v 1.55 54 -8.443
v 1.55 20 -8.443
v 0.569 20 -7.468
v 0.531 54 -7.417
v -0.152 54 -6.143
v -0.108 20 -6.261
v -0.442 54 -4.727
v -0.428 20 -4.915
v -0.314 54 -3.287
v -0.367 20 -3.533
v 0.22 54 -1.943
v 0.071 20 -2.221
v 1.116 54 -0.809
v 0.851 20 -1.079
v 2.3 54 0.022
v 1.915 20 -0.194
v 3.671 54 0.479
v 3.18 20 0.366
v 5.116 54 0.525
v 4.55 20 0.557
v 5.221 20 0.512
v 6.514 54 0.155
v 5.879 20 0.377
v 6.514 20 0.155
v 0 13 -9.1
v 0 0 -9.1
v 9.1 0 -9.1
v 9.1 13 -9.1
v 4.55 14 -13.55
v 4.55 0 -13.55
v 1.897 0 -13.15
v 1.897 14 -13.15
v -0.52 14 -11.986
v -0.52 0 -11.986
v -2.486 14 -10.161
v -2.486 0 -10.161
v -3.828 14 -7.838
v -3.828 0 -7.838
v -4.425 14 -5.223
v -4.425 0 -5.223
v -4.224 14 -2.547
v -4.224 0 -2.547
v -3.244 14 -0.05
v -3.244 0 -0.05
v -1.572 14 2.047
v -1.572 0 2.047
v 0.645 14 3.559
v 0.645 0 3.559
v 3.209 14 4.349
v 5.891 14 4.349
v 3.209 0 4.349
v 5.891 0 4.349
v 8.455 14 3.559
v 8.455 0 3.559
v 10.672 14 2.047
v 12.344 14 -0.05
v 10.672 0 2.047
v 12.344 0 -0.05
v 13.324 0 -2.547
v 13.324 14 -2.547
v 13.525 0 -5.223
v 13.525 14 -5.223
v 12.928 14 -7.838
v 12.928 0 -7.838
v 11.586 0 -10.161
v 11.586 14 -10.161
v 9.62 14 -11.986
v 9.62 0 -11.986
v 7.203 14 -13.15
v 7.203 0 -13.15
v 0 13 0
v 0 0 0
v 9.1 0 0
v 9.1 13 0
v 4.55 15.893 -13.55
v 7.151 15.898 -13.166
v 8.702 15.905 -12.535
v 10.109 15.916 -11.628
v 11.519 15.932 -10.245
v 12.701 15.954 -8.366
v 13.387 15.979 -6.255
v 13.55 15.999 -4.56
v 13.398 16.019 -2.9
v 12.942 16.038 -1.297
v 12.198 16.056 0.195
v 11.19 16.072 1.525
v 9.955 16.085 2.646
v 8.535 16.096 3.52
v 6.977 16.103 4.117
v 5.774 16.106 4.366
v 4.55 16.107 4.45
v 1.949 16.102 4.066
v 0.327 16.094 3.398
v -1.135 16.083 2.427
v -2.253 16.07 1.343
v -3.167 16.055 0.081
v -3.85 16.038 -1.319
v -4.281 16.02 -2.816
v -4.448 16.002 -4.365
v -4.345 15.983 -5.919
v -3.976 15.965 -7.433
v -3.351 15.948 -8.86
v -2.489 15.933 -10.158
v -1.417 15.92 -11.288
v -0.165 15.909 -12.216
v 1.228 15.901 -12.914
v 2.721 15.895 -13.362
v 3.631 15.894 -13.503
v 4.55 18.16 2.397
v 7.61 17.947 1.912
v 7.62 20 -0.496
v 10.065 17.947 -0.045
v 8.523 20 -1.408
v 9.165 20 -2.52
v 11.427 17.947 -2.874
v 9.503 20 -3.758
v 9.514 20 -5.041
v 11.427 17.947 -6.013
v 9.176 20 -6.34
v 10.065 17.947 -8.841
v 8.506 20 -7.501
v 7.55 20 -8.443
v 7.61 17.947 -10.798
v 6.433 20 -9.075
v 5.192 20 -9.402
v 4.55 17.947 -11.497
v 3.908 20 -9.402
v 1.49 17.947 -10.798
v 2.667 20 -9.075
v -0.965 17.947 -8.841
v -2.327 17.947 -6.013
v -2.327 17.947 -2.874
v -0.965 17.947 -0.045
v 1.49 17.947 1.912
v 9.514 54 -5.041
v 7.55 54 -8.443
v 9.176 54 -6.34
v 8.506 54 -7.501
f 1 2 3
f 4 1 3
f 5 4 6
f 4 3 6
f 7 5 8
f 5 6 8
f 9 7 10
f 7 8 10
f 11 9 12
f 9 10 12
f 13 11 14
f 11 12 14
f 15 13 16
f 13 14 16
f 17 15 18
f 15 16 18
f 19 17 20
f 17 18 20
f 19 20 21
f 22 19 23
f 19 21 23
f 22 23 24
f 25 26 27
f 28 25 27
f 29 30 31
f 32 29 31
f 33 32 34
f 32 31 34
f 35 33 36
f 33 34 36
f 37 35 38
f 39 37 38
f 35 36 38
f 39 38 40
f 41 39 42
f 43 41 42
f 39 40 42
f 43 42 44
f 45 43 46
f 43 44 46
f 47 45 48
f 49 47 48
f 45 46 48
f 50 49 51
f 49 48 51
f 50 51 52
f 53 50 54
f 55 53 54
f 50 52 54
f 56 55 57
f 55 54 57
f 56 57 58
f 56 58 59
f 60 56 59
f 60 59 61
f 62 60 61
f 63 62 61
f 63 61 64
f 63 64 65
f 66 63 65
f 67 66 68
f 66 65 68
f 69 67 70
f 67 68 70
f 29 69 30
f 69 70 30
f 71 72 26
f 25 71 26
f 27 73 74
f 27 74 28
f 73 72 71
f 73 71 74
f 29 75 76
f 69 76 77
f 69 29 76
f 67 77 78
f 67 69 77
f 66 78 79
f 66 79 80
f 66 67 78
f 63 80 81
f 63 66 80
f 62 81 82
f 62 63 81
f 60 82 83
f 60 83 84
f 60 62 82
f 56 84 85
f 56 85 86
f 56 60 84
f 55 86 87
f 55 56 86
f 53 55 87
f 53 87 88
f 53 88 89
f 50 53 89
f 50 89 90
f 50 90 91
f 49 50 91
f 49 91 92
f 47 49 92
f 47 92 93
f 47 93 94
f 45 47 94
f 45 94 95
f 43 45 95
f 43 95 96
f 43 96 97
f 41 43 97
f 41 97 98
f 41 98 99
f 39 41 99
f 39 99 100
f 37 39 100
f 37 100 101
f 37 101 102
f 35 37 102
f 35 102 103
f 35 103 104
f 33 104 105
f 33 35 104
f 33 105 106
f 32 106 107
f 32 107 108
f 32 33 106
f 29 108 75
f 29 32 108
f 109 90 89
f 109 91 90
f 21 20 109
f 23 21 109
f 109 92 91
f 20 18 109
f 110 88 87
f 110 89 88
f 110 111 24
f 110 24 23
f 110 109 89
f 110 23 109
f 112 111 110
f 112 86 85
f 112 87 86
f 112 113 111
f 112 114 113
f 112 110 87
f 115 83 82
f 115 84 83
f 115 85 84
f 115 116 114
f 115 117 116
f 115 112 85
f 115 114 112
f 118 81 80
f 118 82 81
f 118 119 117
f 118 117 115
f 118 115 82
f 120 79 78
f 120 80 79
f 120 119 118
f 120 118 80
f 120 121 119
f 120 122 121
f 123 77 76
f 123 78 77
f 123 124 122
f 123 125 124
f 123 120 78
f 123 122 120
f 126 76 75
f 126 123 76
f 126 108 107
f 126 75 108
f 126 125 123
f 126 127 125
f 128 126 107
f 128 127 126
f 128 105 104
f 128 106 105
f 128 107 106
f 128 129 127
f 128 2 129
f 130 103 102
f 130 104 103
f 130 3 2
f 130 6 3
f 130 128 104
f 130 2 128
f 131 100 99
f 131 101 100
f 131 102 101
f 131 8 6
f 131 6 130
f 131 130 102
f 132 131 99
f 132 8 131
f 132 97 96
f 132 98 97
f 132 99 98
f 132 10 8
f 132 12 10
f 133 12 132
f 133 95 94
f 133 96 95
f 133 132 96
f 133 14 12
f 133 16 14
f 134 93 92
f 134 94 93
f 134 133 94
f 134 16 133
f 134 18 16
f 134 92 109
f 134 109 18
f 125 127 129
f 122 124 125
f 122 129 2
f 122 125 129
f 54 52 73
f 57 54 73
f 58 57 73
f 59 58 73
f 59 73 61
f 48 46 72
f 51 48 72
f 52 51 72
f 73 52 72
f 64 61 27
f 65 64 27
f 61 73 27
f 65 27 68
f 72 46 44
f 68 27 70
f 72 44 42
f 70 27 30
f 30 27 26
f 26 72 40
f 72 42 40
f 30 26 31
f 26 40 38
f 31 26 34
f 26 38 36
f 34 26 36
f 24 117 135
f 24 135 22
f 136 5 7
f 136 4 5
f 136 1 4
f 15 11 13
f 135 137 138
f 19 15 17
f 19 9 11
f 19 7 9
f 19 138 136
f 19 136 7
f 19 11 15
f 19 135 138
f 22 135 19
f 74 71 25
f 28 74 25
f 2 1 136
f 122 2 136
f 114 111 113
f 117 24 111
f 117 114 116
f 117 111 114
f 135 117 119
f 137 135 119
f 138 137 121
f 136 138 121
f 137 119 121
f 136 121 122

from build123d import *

# Parameters (mm, degrees)
SKETCH1_R           = 9
SKETCH1_W           = 9.1
SKETCH1_H           = 9.1
BOSS_EXTRUDE1_DEPTH = 13
SKETCH2_R           = 9
BOSS_EXTRUDE2_DEPTH = 1
SKETCH3_R           = 5
BOSS_EXTRUDE3_DEPTH = 40
CHAMFER1_SIZE       = 6
SKETCH4_W           = 6
SKETCH4_H           = 4.360376731
CUT_EXTRUDE1_DEPTH  = 34


with BuildPart() as part:
    # Sketch1 → Boss-Extrude1 (new body)
    with BuildSketch(Plane(origin=(0, 0, 0), x_dir=(1, 0, 0), z_dir=(0, 1, 0))):
        with Locations(Location((4.55, 4.55, 0), (0, 0, 90))):
            Circle(SKETCH1_R)
        with Locations((4.55, 4.55)):
            Rectangle(SKETCH1_W, SKETCH1_H, mode=Mode.SUBTRACT)
    extrude(amount=BOSS_EXTRUDE1_DEPTH)

    # Sketch2 → Boss-Extrude2 (add)
    with BuildSketch(Plane(origin=(0, 13, 0), x_dir=(1, 0, 0), z_dir=(0, 1, 0))):
        with Locations(Location((4.55, 4.55, 0), (0, 0, 90))):
            Circle(SKETCH2_R)
    extrude(amount=BOSS_EXTRUDE2_DEPTH)

    # Sketch3 → Boss-Extrude3 (add)
    with BuildSketch(Plane(origin=(0, 14, 0), x_dir=(1, 0, 0), z_dir=(0, 1, 0))):
        with Locations(Location((4.55, 4.443091139, 0), (0, 0, 270))):
            Circle(SKETCH3_R)
    extrude(amount=BOSS_EXTRUDE3_DEPTH)

    # Chamfer1
    # the kernel refuses this chamfer: 6 mm, written as the material it adds along each edge
    with BuildSketch(Plane(origin=(4.55, 14, -4.443091139), x_dir=(0, 0, 1), z_dir=(-1, 0, 0))) as chamfer1_piece_1_section:
        Polygon((5 + CHAMFER1_SIZE, 0), (5, CHAMFER1_SIZE), (5, 0), align=None)
    chamfer1_piece_1 = revolve(axis=Axis((4.55, 14, -4.443091139), (0, 1, 0)), mode=Mode.PRIVATE)
    chamfer1_piece_1 = chamfer1_piece_1 & Plane(origin=(4.55, 17.968075817, -4.55), x_dir=(0, 0, -1), z_dir=(0, -1, 0)) * Cylinder(9, 44, mode=Mode.PRIVATE)
    add(chamfer1_piece_1)

    # Sketch4 → Cut-Extrude1 (cut)
    with BuildSketch(Plane(origin=(0, 54, 0), x_dir=(1, 0, 0), z_dir=(0, 1, 0))):
        Polygon((13.290298635, 2.860978984), (9.514101615, 5.04116735), (6.514101615, -0.154985073), (10.290298635, -2.335173438), align=None)
        with Locations((4.55, 10.623279505)):
            Rectangle(SKETCH4_W, SKETCH4_H)
    extrude(amount=-CUT_EXTRUDE1_DEPTH, mode=Mode.SUBTRACT)


solid = part.part
